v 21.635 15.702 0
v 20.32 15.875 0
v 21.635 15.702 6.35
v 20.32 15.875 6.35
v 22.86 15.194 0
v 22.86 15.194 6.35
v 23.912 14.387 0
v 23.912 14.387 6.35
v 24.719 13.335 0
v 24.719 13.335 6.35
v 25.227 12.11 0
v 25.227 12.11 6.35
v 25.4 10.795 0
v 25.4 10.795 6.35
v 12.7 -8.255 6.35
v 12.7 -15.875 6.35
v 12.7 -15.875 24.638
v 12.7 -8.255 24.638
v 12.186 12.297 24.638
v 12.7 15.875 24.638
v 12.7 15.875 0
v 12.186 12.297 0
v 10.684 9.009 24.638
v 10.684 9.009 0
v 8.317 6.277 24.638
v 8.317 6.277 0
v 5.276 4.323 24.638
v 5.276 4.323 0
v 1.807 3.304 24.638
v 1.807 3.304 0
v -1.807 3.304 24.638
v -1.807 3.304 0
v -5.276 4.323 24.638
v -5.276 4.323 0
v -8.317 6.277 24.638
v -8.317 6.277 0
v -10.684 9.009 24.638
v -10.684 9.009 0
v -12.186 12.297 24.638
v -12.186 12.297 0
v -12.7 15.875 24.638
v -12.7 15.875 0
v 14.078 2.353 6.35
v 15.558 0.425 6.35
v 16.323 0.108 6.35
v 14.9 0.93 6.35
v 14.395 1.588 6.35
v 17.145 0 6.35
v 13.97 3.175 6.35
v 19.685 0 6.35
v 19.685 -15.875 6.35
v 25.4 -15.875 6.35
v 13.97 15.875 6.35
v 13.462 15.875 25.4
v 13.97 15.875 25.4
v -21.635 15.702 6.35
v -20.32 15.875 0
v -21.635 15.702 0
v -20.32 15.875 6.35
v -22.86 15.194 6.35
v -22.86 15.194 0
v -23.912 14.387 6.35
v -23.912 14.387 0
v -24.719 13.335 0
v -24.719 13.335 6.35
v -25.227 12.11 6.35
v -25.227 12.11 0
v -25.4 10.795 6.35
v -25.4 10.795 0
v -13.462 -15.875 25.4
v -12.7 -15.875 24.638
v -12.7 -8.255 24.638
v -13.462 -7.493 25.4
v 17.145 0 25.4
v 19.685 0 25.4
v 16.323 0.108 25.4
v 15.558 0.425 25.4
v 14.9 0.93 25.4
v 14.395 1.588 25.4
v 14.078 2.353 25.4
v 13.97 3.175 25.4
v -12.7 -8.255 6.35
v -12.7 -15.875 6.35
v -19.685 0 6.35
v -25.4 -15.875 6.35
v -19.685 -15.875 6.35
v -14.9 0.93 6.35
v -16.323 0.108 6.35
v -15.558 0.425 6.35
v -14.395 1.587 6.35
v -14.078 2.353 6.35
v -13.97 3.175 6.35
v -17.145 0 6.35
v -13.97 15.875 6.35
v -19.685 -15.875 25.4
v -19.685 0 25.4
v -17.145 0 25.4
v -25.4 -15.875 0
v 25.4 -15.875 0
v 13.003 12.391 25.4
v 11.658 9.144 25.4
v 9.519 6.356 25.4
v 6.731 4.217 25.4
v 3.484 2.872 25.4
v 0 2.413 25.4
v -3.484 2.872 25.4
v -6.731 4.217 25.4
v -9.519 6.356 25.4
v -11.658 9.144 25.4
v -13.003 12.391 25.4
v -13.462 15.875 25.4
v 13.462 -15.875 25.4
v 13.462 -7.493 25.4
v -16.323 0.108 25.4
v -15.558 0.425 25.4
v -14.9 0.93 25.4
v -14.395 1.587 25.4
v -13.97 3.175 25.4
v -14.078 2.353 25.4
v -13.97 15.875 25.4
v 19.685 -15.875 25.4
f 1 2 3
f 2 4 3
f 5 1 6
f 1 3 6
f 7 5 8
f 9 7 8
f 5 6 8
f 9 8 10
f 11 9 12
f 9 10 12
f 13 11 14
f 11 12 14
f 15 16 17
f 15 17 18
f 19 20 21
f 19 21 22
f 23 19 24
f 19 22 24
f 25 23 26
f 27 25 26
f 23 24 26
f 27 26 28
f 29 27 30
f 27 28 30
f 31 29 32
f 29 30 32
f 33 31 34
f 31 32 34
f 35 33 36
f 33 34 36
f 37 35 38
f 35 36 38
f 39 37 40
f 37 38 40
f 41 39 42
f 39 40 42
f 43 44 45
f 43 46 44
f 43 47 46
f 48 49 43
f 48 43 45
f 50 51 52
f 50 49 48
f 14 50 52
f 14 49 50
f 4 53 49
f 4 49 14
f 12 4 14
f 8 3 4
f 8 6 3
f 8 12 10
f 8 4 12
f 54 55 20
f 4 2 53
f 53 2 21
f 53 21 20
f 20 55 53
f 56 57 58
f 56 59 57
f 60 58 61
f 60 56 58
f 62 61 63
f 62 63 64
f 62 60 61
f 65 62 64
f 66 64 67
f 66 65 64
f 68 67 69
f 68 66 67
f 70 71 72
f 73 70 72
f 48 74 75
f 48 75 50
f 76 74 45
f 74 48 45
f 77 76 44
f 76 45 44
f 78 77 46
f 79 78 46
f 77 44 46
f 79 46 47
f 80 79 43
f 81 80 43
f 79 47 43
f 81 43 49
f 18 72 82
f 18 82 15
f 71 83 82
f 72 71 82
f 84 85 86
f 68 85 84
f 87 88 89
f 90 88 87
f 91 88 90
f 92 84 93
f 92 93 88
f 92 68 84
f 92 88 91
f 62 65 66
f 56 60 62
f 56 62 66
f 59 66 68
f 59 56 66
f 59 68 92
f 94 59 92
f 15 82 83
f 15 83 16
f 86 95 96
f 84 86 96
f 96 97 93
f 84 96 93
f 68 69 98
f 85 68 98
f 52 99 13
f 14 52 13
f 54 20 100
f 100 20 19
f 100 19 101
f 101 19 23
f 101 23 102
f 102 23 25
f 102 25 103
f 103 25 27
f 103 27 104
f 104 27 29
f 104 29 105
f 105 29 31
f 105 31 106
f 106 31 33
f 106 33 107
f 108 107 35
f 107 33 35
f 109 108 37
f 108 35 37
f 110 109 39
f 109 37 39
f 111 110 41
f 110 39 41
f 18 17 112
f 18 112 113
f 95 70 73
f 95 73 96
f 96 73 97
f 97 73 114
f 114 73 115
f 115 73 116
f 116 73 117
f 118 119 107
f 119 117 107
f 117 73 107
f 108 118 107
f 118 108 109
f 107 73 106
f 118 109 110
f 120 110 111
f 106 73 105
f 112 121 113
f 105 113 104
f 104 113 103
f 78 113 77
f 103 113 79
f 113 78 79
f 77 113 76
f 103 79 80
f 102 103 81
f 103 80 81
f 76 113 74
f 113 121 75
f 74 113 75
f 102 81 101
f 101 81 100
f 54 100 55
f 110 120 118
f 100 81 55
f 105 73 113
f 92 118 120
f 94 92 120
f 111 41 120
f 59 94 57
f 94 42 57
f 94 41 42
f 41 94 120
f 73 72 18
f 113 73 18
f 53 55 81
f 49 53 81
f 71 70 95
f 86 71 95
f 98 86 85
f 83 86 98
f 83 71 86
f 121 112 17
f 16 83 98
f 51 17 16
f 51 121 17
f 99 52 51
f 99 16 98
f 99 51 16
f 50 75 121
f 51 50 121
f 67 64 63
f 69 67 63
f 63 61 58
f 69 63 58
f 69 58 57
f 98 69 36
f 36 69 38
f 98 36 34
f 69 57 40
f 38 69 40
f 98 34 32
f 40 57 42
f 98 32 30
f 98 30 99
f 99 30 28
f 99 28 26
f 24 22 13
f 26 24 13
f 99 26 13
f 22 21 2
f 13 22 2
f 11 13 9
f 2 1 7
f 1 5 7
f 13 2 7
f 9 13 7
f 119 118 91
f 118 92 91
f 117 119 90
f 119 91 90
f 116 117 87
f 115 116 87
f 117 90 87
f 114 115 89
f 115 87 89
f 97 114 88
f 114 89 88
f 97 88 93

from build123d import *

# Parameters (mm, degrees)
F1_DEPTH = 25.4
F2_W     = 25.4
F2_H     = 7.62
F3_DEPTH = 19.05
F5_DEPTH = 19.05
F6_R     = 5.08
F7_DEPTH = 3.175
F8_DEPTH = 3.175
F9_R     = 3.175
F10_SIZE = 0.762


with BuildPart() as f1:
    # F0 (on Top) → F1 (new body)
    with BuildSketch(Plane.XY):
        with BuildLine():
            Line((25.4, 15.875), (12.7, 15.875))
            ThreePointArc((12.7, 15.875), (0, 3.175), (-12.7, 15.875))
            Line((-12.7, 15.875), (-25.4, 15.875))
            Line((-25.4, 15.875), (-25.4, -15.875))
            Line((-25.4, -15.875), (25.4, -15.875))
            Line((25.4, -15.875), (25.4, 15.875))
        make_face()
    extrude(amount=F1_DEPTH)

    # F2 (on face) → F3 (cut)
    with BuildSketch(Plane.XY.offset(25.4)):
        with Locations((0, -12.065)):
            Rectangle(F2_W, F2_H)
    extrude(amount=-F3_DEPTH, mode=Mode.SUBTRACT)

    # F4 (on face) → F5 (cut)
    with BuildSketch(Plane.XY.offset(25.4)):
        Polygon((-25.4, 15.875), (-25.4, -15.875), (-16.51, -15.875), (-16.51, 0), (-13.97, 0), (-13.97, 15.875), align=None)
        Polygon((25.4, 15.875), (13.97, 15.875), (13.97, 0), (16.51, 0), (16.51, -15.875), (25.4, -15.875), align=None)
    extrude(amount=-F5_DEPTH, mode=Mode.SUBTRACT)

    # F6
    f6_edges = [f1.edges().sort_by_distance(p)[0] for p in [
        (25.4, 15.875, 3.175),
        (-25.4, 15.875, 3.175),
    ]]
    fillet(f6_edges, radius=F6_R)

    # F7 (add): a face of the model
    f7_faces = [f1.faces().sort_by_distance(p)[0] for p in [
        (16.51, -7.9375, 15.875),
    ]]
    extrude(f7_faces, amount=F7_DEPTH)

    # F8 (add): a face of the model
    f8_faces = [f1.faces().sort_by_distance(p)[0] for p in [
        (-16.51, -7.9375, 15.875),
    ]]
    extrude(f8_faces, amount=F8_DEPTH)

    # F9
    f9_edges = [f1.edges().sort_by_distance(p)[0] for p in [
        (-13.97, 0, 15.875),
        (13.97, 0, 15.875),
    ]]
    fillet(f9_edges, radius=F9_R)

    # F10
    f10_edges = [f1.edges().sort_by_distance(p)[0] for p in [
        (0, -8.255, 25.4),
        (12.7, -12.065, 25.4),
        (-12.7, -12.065, 25.4),
        (0, 3.175, 25.4),
    ]]
    chamfer(f10_edges, length=F10_SIZE)


solid = f1.part
